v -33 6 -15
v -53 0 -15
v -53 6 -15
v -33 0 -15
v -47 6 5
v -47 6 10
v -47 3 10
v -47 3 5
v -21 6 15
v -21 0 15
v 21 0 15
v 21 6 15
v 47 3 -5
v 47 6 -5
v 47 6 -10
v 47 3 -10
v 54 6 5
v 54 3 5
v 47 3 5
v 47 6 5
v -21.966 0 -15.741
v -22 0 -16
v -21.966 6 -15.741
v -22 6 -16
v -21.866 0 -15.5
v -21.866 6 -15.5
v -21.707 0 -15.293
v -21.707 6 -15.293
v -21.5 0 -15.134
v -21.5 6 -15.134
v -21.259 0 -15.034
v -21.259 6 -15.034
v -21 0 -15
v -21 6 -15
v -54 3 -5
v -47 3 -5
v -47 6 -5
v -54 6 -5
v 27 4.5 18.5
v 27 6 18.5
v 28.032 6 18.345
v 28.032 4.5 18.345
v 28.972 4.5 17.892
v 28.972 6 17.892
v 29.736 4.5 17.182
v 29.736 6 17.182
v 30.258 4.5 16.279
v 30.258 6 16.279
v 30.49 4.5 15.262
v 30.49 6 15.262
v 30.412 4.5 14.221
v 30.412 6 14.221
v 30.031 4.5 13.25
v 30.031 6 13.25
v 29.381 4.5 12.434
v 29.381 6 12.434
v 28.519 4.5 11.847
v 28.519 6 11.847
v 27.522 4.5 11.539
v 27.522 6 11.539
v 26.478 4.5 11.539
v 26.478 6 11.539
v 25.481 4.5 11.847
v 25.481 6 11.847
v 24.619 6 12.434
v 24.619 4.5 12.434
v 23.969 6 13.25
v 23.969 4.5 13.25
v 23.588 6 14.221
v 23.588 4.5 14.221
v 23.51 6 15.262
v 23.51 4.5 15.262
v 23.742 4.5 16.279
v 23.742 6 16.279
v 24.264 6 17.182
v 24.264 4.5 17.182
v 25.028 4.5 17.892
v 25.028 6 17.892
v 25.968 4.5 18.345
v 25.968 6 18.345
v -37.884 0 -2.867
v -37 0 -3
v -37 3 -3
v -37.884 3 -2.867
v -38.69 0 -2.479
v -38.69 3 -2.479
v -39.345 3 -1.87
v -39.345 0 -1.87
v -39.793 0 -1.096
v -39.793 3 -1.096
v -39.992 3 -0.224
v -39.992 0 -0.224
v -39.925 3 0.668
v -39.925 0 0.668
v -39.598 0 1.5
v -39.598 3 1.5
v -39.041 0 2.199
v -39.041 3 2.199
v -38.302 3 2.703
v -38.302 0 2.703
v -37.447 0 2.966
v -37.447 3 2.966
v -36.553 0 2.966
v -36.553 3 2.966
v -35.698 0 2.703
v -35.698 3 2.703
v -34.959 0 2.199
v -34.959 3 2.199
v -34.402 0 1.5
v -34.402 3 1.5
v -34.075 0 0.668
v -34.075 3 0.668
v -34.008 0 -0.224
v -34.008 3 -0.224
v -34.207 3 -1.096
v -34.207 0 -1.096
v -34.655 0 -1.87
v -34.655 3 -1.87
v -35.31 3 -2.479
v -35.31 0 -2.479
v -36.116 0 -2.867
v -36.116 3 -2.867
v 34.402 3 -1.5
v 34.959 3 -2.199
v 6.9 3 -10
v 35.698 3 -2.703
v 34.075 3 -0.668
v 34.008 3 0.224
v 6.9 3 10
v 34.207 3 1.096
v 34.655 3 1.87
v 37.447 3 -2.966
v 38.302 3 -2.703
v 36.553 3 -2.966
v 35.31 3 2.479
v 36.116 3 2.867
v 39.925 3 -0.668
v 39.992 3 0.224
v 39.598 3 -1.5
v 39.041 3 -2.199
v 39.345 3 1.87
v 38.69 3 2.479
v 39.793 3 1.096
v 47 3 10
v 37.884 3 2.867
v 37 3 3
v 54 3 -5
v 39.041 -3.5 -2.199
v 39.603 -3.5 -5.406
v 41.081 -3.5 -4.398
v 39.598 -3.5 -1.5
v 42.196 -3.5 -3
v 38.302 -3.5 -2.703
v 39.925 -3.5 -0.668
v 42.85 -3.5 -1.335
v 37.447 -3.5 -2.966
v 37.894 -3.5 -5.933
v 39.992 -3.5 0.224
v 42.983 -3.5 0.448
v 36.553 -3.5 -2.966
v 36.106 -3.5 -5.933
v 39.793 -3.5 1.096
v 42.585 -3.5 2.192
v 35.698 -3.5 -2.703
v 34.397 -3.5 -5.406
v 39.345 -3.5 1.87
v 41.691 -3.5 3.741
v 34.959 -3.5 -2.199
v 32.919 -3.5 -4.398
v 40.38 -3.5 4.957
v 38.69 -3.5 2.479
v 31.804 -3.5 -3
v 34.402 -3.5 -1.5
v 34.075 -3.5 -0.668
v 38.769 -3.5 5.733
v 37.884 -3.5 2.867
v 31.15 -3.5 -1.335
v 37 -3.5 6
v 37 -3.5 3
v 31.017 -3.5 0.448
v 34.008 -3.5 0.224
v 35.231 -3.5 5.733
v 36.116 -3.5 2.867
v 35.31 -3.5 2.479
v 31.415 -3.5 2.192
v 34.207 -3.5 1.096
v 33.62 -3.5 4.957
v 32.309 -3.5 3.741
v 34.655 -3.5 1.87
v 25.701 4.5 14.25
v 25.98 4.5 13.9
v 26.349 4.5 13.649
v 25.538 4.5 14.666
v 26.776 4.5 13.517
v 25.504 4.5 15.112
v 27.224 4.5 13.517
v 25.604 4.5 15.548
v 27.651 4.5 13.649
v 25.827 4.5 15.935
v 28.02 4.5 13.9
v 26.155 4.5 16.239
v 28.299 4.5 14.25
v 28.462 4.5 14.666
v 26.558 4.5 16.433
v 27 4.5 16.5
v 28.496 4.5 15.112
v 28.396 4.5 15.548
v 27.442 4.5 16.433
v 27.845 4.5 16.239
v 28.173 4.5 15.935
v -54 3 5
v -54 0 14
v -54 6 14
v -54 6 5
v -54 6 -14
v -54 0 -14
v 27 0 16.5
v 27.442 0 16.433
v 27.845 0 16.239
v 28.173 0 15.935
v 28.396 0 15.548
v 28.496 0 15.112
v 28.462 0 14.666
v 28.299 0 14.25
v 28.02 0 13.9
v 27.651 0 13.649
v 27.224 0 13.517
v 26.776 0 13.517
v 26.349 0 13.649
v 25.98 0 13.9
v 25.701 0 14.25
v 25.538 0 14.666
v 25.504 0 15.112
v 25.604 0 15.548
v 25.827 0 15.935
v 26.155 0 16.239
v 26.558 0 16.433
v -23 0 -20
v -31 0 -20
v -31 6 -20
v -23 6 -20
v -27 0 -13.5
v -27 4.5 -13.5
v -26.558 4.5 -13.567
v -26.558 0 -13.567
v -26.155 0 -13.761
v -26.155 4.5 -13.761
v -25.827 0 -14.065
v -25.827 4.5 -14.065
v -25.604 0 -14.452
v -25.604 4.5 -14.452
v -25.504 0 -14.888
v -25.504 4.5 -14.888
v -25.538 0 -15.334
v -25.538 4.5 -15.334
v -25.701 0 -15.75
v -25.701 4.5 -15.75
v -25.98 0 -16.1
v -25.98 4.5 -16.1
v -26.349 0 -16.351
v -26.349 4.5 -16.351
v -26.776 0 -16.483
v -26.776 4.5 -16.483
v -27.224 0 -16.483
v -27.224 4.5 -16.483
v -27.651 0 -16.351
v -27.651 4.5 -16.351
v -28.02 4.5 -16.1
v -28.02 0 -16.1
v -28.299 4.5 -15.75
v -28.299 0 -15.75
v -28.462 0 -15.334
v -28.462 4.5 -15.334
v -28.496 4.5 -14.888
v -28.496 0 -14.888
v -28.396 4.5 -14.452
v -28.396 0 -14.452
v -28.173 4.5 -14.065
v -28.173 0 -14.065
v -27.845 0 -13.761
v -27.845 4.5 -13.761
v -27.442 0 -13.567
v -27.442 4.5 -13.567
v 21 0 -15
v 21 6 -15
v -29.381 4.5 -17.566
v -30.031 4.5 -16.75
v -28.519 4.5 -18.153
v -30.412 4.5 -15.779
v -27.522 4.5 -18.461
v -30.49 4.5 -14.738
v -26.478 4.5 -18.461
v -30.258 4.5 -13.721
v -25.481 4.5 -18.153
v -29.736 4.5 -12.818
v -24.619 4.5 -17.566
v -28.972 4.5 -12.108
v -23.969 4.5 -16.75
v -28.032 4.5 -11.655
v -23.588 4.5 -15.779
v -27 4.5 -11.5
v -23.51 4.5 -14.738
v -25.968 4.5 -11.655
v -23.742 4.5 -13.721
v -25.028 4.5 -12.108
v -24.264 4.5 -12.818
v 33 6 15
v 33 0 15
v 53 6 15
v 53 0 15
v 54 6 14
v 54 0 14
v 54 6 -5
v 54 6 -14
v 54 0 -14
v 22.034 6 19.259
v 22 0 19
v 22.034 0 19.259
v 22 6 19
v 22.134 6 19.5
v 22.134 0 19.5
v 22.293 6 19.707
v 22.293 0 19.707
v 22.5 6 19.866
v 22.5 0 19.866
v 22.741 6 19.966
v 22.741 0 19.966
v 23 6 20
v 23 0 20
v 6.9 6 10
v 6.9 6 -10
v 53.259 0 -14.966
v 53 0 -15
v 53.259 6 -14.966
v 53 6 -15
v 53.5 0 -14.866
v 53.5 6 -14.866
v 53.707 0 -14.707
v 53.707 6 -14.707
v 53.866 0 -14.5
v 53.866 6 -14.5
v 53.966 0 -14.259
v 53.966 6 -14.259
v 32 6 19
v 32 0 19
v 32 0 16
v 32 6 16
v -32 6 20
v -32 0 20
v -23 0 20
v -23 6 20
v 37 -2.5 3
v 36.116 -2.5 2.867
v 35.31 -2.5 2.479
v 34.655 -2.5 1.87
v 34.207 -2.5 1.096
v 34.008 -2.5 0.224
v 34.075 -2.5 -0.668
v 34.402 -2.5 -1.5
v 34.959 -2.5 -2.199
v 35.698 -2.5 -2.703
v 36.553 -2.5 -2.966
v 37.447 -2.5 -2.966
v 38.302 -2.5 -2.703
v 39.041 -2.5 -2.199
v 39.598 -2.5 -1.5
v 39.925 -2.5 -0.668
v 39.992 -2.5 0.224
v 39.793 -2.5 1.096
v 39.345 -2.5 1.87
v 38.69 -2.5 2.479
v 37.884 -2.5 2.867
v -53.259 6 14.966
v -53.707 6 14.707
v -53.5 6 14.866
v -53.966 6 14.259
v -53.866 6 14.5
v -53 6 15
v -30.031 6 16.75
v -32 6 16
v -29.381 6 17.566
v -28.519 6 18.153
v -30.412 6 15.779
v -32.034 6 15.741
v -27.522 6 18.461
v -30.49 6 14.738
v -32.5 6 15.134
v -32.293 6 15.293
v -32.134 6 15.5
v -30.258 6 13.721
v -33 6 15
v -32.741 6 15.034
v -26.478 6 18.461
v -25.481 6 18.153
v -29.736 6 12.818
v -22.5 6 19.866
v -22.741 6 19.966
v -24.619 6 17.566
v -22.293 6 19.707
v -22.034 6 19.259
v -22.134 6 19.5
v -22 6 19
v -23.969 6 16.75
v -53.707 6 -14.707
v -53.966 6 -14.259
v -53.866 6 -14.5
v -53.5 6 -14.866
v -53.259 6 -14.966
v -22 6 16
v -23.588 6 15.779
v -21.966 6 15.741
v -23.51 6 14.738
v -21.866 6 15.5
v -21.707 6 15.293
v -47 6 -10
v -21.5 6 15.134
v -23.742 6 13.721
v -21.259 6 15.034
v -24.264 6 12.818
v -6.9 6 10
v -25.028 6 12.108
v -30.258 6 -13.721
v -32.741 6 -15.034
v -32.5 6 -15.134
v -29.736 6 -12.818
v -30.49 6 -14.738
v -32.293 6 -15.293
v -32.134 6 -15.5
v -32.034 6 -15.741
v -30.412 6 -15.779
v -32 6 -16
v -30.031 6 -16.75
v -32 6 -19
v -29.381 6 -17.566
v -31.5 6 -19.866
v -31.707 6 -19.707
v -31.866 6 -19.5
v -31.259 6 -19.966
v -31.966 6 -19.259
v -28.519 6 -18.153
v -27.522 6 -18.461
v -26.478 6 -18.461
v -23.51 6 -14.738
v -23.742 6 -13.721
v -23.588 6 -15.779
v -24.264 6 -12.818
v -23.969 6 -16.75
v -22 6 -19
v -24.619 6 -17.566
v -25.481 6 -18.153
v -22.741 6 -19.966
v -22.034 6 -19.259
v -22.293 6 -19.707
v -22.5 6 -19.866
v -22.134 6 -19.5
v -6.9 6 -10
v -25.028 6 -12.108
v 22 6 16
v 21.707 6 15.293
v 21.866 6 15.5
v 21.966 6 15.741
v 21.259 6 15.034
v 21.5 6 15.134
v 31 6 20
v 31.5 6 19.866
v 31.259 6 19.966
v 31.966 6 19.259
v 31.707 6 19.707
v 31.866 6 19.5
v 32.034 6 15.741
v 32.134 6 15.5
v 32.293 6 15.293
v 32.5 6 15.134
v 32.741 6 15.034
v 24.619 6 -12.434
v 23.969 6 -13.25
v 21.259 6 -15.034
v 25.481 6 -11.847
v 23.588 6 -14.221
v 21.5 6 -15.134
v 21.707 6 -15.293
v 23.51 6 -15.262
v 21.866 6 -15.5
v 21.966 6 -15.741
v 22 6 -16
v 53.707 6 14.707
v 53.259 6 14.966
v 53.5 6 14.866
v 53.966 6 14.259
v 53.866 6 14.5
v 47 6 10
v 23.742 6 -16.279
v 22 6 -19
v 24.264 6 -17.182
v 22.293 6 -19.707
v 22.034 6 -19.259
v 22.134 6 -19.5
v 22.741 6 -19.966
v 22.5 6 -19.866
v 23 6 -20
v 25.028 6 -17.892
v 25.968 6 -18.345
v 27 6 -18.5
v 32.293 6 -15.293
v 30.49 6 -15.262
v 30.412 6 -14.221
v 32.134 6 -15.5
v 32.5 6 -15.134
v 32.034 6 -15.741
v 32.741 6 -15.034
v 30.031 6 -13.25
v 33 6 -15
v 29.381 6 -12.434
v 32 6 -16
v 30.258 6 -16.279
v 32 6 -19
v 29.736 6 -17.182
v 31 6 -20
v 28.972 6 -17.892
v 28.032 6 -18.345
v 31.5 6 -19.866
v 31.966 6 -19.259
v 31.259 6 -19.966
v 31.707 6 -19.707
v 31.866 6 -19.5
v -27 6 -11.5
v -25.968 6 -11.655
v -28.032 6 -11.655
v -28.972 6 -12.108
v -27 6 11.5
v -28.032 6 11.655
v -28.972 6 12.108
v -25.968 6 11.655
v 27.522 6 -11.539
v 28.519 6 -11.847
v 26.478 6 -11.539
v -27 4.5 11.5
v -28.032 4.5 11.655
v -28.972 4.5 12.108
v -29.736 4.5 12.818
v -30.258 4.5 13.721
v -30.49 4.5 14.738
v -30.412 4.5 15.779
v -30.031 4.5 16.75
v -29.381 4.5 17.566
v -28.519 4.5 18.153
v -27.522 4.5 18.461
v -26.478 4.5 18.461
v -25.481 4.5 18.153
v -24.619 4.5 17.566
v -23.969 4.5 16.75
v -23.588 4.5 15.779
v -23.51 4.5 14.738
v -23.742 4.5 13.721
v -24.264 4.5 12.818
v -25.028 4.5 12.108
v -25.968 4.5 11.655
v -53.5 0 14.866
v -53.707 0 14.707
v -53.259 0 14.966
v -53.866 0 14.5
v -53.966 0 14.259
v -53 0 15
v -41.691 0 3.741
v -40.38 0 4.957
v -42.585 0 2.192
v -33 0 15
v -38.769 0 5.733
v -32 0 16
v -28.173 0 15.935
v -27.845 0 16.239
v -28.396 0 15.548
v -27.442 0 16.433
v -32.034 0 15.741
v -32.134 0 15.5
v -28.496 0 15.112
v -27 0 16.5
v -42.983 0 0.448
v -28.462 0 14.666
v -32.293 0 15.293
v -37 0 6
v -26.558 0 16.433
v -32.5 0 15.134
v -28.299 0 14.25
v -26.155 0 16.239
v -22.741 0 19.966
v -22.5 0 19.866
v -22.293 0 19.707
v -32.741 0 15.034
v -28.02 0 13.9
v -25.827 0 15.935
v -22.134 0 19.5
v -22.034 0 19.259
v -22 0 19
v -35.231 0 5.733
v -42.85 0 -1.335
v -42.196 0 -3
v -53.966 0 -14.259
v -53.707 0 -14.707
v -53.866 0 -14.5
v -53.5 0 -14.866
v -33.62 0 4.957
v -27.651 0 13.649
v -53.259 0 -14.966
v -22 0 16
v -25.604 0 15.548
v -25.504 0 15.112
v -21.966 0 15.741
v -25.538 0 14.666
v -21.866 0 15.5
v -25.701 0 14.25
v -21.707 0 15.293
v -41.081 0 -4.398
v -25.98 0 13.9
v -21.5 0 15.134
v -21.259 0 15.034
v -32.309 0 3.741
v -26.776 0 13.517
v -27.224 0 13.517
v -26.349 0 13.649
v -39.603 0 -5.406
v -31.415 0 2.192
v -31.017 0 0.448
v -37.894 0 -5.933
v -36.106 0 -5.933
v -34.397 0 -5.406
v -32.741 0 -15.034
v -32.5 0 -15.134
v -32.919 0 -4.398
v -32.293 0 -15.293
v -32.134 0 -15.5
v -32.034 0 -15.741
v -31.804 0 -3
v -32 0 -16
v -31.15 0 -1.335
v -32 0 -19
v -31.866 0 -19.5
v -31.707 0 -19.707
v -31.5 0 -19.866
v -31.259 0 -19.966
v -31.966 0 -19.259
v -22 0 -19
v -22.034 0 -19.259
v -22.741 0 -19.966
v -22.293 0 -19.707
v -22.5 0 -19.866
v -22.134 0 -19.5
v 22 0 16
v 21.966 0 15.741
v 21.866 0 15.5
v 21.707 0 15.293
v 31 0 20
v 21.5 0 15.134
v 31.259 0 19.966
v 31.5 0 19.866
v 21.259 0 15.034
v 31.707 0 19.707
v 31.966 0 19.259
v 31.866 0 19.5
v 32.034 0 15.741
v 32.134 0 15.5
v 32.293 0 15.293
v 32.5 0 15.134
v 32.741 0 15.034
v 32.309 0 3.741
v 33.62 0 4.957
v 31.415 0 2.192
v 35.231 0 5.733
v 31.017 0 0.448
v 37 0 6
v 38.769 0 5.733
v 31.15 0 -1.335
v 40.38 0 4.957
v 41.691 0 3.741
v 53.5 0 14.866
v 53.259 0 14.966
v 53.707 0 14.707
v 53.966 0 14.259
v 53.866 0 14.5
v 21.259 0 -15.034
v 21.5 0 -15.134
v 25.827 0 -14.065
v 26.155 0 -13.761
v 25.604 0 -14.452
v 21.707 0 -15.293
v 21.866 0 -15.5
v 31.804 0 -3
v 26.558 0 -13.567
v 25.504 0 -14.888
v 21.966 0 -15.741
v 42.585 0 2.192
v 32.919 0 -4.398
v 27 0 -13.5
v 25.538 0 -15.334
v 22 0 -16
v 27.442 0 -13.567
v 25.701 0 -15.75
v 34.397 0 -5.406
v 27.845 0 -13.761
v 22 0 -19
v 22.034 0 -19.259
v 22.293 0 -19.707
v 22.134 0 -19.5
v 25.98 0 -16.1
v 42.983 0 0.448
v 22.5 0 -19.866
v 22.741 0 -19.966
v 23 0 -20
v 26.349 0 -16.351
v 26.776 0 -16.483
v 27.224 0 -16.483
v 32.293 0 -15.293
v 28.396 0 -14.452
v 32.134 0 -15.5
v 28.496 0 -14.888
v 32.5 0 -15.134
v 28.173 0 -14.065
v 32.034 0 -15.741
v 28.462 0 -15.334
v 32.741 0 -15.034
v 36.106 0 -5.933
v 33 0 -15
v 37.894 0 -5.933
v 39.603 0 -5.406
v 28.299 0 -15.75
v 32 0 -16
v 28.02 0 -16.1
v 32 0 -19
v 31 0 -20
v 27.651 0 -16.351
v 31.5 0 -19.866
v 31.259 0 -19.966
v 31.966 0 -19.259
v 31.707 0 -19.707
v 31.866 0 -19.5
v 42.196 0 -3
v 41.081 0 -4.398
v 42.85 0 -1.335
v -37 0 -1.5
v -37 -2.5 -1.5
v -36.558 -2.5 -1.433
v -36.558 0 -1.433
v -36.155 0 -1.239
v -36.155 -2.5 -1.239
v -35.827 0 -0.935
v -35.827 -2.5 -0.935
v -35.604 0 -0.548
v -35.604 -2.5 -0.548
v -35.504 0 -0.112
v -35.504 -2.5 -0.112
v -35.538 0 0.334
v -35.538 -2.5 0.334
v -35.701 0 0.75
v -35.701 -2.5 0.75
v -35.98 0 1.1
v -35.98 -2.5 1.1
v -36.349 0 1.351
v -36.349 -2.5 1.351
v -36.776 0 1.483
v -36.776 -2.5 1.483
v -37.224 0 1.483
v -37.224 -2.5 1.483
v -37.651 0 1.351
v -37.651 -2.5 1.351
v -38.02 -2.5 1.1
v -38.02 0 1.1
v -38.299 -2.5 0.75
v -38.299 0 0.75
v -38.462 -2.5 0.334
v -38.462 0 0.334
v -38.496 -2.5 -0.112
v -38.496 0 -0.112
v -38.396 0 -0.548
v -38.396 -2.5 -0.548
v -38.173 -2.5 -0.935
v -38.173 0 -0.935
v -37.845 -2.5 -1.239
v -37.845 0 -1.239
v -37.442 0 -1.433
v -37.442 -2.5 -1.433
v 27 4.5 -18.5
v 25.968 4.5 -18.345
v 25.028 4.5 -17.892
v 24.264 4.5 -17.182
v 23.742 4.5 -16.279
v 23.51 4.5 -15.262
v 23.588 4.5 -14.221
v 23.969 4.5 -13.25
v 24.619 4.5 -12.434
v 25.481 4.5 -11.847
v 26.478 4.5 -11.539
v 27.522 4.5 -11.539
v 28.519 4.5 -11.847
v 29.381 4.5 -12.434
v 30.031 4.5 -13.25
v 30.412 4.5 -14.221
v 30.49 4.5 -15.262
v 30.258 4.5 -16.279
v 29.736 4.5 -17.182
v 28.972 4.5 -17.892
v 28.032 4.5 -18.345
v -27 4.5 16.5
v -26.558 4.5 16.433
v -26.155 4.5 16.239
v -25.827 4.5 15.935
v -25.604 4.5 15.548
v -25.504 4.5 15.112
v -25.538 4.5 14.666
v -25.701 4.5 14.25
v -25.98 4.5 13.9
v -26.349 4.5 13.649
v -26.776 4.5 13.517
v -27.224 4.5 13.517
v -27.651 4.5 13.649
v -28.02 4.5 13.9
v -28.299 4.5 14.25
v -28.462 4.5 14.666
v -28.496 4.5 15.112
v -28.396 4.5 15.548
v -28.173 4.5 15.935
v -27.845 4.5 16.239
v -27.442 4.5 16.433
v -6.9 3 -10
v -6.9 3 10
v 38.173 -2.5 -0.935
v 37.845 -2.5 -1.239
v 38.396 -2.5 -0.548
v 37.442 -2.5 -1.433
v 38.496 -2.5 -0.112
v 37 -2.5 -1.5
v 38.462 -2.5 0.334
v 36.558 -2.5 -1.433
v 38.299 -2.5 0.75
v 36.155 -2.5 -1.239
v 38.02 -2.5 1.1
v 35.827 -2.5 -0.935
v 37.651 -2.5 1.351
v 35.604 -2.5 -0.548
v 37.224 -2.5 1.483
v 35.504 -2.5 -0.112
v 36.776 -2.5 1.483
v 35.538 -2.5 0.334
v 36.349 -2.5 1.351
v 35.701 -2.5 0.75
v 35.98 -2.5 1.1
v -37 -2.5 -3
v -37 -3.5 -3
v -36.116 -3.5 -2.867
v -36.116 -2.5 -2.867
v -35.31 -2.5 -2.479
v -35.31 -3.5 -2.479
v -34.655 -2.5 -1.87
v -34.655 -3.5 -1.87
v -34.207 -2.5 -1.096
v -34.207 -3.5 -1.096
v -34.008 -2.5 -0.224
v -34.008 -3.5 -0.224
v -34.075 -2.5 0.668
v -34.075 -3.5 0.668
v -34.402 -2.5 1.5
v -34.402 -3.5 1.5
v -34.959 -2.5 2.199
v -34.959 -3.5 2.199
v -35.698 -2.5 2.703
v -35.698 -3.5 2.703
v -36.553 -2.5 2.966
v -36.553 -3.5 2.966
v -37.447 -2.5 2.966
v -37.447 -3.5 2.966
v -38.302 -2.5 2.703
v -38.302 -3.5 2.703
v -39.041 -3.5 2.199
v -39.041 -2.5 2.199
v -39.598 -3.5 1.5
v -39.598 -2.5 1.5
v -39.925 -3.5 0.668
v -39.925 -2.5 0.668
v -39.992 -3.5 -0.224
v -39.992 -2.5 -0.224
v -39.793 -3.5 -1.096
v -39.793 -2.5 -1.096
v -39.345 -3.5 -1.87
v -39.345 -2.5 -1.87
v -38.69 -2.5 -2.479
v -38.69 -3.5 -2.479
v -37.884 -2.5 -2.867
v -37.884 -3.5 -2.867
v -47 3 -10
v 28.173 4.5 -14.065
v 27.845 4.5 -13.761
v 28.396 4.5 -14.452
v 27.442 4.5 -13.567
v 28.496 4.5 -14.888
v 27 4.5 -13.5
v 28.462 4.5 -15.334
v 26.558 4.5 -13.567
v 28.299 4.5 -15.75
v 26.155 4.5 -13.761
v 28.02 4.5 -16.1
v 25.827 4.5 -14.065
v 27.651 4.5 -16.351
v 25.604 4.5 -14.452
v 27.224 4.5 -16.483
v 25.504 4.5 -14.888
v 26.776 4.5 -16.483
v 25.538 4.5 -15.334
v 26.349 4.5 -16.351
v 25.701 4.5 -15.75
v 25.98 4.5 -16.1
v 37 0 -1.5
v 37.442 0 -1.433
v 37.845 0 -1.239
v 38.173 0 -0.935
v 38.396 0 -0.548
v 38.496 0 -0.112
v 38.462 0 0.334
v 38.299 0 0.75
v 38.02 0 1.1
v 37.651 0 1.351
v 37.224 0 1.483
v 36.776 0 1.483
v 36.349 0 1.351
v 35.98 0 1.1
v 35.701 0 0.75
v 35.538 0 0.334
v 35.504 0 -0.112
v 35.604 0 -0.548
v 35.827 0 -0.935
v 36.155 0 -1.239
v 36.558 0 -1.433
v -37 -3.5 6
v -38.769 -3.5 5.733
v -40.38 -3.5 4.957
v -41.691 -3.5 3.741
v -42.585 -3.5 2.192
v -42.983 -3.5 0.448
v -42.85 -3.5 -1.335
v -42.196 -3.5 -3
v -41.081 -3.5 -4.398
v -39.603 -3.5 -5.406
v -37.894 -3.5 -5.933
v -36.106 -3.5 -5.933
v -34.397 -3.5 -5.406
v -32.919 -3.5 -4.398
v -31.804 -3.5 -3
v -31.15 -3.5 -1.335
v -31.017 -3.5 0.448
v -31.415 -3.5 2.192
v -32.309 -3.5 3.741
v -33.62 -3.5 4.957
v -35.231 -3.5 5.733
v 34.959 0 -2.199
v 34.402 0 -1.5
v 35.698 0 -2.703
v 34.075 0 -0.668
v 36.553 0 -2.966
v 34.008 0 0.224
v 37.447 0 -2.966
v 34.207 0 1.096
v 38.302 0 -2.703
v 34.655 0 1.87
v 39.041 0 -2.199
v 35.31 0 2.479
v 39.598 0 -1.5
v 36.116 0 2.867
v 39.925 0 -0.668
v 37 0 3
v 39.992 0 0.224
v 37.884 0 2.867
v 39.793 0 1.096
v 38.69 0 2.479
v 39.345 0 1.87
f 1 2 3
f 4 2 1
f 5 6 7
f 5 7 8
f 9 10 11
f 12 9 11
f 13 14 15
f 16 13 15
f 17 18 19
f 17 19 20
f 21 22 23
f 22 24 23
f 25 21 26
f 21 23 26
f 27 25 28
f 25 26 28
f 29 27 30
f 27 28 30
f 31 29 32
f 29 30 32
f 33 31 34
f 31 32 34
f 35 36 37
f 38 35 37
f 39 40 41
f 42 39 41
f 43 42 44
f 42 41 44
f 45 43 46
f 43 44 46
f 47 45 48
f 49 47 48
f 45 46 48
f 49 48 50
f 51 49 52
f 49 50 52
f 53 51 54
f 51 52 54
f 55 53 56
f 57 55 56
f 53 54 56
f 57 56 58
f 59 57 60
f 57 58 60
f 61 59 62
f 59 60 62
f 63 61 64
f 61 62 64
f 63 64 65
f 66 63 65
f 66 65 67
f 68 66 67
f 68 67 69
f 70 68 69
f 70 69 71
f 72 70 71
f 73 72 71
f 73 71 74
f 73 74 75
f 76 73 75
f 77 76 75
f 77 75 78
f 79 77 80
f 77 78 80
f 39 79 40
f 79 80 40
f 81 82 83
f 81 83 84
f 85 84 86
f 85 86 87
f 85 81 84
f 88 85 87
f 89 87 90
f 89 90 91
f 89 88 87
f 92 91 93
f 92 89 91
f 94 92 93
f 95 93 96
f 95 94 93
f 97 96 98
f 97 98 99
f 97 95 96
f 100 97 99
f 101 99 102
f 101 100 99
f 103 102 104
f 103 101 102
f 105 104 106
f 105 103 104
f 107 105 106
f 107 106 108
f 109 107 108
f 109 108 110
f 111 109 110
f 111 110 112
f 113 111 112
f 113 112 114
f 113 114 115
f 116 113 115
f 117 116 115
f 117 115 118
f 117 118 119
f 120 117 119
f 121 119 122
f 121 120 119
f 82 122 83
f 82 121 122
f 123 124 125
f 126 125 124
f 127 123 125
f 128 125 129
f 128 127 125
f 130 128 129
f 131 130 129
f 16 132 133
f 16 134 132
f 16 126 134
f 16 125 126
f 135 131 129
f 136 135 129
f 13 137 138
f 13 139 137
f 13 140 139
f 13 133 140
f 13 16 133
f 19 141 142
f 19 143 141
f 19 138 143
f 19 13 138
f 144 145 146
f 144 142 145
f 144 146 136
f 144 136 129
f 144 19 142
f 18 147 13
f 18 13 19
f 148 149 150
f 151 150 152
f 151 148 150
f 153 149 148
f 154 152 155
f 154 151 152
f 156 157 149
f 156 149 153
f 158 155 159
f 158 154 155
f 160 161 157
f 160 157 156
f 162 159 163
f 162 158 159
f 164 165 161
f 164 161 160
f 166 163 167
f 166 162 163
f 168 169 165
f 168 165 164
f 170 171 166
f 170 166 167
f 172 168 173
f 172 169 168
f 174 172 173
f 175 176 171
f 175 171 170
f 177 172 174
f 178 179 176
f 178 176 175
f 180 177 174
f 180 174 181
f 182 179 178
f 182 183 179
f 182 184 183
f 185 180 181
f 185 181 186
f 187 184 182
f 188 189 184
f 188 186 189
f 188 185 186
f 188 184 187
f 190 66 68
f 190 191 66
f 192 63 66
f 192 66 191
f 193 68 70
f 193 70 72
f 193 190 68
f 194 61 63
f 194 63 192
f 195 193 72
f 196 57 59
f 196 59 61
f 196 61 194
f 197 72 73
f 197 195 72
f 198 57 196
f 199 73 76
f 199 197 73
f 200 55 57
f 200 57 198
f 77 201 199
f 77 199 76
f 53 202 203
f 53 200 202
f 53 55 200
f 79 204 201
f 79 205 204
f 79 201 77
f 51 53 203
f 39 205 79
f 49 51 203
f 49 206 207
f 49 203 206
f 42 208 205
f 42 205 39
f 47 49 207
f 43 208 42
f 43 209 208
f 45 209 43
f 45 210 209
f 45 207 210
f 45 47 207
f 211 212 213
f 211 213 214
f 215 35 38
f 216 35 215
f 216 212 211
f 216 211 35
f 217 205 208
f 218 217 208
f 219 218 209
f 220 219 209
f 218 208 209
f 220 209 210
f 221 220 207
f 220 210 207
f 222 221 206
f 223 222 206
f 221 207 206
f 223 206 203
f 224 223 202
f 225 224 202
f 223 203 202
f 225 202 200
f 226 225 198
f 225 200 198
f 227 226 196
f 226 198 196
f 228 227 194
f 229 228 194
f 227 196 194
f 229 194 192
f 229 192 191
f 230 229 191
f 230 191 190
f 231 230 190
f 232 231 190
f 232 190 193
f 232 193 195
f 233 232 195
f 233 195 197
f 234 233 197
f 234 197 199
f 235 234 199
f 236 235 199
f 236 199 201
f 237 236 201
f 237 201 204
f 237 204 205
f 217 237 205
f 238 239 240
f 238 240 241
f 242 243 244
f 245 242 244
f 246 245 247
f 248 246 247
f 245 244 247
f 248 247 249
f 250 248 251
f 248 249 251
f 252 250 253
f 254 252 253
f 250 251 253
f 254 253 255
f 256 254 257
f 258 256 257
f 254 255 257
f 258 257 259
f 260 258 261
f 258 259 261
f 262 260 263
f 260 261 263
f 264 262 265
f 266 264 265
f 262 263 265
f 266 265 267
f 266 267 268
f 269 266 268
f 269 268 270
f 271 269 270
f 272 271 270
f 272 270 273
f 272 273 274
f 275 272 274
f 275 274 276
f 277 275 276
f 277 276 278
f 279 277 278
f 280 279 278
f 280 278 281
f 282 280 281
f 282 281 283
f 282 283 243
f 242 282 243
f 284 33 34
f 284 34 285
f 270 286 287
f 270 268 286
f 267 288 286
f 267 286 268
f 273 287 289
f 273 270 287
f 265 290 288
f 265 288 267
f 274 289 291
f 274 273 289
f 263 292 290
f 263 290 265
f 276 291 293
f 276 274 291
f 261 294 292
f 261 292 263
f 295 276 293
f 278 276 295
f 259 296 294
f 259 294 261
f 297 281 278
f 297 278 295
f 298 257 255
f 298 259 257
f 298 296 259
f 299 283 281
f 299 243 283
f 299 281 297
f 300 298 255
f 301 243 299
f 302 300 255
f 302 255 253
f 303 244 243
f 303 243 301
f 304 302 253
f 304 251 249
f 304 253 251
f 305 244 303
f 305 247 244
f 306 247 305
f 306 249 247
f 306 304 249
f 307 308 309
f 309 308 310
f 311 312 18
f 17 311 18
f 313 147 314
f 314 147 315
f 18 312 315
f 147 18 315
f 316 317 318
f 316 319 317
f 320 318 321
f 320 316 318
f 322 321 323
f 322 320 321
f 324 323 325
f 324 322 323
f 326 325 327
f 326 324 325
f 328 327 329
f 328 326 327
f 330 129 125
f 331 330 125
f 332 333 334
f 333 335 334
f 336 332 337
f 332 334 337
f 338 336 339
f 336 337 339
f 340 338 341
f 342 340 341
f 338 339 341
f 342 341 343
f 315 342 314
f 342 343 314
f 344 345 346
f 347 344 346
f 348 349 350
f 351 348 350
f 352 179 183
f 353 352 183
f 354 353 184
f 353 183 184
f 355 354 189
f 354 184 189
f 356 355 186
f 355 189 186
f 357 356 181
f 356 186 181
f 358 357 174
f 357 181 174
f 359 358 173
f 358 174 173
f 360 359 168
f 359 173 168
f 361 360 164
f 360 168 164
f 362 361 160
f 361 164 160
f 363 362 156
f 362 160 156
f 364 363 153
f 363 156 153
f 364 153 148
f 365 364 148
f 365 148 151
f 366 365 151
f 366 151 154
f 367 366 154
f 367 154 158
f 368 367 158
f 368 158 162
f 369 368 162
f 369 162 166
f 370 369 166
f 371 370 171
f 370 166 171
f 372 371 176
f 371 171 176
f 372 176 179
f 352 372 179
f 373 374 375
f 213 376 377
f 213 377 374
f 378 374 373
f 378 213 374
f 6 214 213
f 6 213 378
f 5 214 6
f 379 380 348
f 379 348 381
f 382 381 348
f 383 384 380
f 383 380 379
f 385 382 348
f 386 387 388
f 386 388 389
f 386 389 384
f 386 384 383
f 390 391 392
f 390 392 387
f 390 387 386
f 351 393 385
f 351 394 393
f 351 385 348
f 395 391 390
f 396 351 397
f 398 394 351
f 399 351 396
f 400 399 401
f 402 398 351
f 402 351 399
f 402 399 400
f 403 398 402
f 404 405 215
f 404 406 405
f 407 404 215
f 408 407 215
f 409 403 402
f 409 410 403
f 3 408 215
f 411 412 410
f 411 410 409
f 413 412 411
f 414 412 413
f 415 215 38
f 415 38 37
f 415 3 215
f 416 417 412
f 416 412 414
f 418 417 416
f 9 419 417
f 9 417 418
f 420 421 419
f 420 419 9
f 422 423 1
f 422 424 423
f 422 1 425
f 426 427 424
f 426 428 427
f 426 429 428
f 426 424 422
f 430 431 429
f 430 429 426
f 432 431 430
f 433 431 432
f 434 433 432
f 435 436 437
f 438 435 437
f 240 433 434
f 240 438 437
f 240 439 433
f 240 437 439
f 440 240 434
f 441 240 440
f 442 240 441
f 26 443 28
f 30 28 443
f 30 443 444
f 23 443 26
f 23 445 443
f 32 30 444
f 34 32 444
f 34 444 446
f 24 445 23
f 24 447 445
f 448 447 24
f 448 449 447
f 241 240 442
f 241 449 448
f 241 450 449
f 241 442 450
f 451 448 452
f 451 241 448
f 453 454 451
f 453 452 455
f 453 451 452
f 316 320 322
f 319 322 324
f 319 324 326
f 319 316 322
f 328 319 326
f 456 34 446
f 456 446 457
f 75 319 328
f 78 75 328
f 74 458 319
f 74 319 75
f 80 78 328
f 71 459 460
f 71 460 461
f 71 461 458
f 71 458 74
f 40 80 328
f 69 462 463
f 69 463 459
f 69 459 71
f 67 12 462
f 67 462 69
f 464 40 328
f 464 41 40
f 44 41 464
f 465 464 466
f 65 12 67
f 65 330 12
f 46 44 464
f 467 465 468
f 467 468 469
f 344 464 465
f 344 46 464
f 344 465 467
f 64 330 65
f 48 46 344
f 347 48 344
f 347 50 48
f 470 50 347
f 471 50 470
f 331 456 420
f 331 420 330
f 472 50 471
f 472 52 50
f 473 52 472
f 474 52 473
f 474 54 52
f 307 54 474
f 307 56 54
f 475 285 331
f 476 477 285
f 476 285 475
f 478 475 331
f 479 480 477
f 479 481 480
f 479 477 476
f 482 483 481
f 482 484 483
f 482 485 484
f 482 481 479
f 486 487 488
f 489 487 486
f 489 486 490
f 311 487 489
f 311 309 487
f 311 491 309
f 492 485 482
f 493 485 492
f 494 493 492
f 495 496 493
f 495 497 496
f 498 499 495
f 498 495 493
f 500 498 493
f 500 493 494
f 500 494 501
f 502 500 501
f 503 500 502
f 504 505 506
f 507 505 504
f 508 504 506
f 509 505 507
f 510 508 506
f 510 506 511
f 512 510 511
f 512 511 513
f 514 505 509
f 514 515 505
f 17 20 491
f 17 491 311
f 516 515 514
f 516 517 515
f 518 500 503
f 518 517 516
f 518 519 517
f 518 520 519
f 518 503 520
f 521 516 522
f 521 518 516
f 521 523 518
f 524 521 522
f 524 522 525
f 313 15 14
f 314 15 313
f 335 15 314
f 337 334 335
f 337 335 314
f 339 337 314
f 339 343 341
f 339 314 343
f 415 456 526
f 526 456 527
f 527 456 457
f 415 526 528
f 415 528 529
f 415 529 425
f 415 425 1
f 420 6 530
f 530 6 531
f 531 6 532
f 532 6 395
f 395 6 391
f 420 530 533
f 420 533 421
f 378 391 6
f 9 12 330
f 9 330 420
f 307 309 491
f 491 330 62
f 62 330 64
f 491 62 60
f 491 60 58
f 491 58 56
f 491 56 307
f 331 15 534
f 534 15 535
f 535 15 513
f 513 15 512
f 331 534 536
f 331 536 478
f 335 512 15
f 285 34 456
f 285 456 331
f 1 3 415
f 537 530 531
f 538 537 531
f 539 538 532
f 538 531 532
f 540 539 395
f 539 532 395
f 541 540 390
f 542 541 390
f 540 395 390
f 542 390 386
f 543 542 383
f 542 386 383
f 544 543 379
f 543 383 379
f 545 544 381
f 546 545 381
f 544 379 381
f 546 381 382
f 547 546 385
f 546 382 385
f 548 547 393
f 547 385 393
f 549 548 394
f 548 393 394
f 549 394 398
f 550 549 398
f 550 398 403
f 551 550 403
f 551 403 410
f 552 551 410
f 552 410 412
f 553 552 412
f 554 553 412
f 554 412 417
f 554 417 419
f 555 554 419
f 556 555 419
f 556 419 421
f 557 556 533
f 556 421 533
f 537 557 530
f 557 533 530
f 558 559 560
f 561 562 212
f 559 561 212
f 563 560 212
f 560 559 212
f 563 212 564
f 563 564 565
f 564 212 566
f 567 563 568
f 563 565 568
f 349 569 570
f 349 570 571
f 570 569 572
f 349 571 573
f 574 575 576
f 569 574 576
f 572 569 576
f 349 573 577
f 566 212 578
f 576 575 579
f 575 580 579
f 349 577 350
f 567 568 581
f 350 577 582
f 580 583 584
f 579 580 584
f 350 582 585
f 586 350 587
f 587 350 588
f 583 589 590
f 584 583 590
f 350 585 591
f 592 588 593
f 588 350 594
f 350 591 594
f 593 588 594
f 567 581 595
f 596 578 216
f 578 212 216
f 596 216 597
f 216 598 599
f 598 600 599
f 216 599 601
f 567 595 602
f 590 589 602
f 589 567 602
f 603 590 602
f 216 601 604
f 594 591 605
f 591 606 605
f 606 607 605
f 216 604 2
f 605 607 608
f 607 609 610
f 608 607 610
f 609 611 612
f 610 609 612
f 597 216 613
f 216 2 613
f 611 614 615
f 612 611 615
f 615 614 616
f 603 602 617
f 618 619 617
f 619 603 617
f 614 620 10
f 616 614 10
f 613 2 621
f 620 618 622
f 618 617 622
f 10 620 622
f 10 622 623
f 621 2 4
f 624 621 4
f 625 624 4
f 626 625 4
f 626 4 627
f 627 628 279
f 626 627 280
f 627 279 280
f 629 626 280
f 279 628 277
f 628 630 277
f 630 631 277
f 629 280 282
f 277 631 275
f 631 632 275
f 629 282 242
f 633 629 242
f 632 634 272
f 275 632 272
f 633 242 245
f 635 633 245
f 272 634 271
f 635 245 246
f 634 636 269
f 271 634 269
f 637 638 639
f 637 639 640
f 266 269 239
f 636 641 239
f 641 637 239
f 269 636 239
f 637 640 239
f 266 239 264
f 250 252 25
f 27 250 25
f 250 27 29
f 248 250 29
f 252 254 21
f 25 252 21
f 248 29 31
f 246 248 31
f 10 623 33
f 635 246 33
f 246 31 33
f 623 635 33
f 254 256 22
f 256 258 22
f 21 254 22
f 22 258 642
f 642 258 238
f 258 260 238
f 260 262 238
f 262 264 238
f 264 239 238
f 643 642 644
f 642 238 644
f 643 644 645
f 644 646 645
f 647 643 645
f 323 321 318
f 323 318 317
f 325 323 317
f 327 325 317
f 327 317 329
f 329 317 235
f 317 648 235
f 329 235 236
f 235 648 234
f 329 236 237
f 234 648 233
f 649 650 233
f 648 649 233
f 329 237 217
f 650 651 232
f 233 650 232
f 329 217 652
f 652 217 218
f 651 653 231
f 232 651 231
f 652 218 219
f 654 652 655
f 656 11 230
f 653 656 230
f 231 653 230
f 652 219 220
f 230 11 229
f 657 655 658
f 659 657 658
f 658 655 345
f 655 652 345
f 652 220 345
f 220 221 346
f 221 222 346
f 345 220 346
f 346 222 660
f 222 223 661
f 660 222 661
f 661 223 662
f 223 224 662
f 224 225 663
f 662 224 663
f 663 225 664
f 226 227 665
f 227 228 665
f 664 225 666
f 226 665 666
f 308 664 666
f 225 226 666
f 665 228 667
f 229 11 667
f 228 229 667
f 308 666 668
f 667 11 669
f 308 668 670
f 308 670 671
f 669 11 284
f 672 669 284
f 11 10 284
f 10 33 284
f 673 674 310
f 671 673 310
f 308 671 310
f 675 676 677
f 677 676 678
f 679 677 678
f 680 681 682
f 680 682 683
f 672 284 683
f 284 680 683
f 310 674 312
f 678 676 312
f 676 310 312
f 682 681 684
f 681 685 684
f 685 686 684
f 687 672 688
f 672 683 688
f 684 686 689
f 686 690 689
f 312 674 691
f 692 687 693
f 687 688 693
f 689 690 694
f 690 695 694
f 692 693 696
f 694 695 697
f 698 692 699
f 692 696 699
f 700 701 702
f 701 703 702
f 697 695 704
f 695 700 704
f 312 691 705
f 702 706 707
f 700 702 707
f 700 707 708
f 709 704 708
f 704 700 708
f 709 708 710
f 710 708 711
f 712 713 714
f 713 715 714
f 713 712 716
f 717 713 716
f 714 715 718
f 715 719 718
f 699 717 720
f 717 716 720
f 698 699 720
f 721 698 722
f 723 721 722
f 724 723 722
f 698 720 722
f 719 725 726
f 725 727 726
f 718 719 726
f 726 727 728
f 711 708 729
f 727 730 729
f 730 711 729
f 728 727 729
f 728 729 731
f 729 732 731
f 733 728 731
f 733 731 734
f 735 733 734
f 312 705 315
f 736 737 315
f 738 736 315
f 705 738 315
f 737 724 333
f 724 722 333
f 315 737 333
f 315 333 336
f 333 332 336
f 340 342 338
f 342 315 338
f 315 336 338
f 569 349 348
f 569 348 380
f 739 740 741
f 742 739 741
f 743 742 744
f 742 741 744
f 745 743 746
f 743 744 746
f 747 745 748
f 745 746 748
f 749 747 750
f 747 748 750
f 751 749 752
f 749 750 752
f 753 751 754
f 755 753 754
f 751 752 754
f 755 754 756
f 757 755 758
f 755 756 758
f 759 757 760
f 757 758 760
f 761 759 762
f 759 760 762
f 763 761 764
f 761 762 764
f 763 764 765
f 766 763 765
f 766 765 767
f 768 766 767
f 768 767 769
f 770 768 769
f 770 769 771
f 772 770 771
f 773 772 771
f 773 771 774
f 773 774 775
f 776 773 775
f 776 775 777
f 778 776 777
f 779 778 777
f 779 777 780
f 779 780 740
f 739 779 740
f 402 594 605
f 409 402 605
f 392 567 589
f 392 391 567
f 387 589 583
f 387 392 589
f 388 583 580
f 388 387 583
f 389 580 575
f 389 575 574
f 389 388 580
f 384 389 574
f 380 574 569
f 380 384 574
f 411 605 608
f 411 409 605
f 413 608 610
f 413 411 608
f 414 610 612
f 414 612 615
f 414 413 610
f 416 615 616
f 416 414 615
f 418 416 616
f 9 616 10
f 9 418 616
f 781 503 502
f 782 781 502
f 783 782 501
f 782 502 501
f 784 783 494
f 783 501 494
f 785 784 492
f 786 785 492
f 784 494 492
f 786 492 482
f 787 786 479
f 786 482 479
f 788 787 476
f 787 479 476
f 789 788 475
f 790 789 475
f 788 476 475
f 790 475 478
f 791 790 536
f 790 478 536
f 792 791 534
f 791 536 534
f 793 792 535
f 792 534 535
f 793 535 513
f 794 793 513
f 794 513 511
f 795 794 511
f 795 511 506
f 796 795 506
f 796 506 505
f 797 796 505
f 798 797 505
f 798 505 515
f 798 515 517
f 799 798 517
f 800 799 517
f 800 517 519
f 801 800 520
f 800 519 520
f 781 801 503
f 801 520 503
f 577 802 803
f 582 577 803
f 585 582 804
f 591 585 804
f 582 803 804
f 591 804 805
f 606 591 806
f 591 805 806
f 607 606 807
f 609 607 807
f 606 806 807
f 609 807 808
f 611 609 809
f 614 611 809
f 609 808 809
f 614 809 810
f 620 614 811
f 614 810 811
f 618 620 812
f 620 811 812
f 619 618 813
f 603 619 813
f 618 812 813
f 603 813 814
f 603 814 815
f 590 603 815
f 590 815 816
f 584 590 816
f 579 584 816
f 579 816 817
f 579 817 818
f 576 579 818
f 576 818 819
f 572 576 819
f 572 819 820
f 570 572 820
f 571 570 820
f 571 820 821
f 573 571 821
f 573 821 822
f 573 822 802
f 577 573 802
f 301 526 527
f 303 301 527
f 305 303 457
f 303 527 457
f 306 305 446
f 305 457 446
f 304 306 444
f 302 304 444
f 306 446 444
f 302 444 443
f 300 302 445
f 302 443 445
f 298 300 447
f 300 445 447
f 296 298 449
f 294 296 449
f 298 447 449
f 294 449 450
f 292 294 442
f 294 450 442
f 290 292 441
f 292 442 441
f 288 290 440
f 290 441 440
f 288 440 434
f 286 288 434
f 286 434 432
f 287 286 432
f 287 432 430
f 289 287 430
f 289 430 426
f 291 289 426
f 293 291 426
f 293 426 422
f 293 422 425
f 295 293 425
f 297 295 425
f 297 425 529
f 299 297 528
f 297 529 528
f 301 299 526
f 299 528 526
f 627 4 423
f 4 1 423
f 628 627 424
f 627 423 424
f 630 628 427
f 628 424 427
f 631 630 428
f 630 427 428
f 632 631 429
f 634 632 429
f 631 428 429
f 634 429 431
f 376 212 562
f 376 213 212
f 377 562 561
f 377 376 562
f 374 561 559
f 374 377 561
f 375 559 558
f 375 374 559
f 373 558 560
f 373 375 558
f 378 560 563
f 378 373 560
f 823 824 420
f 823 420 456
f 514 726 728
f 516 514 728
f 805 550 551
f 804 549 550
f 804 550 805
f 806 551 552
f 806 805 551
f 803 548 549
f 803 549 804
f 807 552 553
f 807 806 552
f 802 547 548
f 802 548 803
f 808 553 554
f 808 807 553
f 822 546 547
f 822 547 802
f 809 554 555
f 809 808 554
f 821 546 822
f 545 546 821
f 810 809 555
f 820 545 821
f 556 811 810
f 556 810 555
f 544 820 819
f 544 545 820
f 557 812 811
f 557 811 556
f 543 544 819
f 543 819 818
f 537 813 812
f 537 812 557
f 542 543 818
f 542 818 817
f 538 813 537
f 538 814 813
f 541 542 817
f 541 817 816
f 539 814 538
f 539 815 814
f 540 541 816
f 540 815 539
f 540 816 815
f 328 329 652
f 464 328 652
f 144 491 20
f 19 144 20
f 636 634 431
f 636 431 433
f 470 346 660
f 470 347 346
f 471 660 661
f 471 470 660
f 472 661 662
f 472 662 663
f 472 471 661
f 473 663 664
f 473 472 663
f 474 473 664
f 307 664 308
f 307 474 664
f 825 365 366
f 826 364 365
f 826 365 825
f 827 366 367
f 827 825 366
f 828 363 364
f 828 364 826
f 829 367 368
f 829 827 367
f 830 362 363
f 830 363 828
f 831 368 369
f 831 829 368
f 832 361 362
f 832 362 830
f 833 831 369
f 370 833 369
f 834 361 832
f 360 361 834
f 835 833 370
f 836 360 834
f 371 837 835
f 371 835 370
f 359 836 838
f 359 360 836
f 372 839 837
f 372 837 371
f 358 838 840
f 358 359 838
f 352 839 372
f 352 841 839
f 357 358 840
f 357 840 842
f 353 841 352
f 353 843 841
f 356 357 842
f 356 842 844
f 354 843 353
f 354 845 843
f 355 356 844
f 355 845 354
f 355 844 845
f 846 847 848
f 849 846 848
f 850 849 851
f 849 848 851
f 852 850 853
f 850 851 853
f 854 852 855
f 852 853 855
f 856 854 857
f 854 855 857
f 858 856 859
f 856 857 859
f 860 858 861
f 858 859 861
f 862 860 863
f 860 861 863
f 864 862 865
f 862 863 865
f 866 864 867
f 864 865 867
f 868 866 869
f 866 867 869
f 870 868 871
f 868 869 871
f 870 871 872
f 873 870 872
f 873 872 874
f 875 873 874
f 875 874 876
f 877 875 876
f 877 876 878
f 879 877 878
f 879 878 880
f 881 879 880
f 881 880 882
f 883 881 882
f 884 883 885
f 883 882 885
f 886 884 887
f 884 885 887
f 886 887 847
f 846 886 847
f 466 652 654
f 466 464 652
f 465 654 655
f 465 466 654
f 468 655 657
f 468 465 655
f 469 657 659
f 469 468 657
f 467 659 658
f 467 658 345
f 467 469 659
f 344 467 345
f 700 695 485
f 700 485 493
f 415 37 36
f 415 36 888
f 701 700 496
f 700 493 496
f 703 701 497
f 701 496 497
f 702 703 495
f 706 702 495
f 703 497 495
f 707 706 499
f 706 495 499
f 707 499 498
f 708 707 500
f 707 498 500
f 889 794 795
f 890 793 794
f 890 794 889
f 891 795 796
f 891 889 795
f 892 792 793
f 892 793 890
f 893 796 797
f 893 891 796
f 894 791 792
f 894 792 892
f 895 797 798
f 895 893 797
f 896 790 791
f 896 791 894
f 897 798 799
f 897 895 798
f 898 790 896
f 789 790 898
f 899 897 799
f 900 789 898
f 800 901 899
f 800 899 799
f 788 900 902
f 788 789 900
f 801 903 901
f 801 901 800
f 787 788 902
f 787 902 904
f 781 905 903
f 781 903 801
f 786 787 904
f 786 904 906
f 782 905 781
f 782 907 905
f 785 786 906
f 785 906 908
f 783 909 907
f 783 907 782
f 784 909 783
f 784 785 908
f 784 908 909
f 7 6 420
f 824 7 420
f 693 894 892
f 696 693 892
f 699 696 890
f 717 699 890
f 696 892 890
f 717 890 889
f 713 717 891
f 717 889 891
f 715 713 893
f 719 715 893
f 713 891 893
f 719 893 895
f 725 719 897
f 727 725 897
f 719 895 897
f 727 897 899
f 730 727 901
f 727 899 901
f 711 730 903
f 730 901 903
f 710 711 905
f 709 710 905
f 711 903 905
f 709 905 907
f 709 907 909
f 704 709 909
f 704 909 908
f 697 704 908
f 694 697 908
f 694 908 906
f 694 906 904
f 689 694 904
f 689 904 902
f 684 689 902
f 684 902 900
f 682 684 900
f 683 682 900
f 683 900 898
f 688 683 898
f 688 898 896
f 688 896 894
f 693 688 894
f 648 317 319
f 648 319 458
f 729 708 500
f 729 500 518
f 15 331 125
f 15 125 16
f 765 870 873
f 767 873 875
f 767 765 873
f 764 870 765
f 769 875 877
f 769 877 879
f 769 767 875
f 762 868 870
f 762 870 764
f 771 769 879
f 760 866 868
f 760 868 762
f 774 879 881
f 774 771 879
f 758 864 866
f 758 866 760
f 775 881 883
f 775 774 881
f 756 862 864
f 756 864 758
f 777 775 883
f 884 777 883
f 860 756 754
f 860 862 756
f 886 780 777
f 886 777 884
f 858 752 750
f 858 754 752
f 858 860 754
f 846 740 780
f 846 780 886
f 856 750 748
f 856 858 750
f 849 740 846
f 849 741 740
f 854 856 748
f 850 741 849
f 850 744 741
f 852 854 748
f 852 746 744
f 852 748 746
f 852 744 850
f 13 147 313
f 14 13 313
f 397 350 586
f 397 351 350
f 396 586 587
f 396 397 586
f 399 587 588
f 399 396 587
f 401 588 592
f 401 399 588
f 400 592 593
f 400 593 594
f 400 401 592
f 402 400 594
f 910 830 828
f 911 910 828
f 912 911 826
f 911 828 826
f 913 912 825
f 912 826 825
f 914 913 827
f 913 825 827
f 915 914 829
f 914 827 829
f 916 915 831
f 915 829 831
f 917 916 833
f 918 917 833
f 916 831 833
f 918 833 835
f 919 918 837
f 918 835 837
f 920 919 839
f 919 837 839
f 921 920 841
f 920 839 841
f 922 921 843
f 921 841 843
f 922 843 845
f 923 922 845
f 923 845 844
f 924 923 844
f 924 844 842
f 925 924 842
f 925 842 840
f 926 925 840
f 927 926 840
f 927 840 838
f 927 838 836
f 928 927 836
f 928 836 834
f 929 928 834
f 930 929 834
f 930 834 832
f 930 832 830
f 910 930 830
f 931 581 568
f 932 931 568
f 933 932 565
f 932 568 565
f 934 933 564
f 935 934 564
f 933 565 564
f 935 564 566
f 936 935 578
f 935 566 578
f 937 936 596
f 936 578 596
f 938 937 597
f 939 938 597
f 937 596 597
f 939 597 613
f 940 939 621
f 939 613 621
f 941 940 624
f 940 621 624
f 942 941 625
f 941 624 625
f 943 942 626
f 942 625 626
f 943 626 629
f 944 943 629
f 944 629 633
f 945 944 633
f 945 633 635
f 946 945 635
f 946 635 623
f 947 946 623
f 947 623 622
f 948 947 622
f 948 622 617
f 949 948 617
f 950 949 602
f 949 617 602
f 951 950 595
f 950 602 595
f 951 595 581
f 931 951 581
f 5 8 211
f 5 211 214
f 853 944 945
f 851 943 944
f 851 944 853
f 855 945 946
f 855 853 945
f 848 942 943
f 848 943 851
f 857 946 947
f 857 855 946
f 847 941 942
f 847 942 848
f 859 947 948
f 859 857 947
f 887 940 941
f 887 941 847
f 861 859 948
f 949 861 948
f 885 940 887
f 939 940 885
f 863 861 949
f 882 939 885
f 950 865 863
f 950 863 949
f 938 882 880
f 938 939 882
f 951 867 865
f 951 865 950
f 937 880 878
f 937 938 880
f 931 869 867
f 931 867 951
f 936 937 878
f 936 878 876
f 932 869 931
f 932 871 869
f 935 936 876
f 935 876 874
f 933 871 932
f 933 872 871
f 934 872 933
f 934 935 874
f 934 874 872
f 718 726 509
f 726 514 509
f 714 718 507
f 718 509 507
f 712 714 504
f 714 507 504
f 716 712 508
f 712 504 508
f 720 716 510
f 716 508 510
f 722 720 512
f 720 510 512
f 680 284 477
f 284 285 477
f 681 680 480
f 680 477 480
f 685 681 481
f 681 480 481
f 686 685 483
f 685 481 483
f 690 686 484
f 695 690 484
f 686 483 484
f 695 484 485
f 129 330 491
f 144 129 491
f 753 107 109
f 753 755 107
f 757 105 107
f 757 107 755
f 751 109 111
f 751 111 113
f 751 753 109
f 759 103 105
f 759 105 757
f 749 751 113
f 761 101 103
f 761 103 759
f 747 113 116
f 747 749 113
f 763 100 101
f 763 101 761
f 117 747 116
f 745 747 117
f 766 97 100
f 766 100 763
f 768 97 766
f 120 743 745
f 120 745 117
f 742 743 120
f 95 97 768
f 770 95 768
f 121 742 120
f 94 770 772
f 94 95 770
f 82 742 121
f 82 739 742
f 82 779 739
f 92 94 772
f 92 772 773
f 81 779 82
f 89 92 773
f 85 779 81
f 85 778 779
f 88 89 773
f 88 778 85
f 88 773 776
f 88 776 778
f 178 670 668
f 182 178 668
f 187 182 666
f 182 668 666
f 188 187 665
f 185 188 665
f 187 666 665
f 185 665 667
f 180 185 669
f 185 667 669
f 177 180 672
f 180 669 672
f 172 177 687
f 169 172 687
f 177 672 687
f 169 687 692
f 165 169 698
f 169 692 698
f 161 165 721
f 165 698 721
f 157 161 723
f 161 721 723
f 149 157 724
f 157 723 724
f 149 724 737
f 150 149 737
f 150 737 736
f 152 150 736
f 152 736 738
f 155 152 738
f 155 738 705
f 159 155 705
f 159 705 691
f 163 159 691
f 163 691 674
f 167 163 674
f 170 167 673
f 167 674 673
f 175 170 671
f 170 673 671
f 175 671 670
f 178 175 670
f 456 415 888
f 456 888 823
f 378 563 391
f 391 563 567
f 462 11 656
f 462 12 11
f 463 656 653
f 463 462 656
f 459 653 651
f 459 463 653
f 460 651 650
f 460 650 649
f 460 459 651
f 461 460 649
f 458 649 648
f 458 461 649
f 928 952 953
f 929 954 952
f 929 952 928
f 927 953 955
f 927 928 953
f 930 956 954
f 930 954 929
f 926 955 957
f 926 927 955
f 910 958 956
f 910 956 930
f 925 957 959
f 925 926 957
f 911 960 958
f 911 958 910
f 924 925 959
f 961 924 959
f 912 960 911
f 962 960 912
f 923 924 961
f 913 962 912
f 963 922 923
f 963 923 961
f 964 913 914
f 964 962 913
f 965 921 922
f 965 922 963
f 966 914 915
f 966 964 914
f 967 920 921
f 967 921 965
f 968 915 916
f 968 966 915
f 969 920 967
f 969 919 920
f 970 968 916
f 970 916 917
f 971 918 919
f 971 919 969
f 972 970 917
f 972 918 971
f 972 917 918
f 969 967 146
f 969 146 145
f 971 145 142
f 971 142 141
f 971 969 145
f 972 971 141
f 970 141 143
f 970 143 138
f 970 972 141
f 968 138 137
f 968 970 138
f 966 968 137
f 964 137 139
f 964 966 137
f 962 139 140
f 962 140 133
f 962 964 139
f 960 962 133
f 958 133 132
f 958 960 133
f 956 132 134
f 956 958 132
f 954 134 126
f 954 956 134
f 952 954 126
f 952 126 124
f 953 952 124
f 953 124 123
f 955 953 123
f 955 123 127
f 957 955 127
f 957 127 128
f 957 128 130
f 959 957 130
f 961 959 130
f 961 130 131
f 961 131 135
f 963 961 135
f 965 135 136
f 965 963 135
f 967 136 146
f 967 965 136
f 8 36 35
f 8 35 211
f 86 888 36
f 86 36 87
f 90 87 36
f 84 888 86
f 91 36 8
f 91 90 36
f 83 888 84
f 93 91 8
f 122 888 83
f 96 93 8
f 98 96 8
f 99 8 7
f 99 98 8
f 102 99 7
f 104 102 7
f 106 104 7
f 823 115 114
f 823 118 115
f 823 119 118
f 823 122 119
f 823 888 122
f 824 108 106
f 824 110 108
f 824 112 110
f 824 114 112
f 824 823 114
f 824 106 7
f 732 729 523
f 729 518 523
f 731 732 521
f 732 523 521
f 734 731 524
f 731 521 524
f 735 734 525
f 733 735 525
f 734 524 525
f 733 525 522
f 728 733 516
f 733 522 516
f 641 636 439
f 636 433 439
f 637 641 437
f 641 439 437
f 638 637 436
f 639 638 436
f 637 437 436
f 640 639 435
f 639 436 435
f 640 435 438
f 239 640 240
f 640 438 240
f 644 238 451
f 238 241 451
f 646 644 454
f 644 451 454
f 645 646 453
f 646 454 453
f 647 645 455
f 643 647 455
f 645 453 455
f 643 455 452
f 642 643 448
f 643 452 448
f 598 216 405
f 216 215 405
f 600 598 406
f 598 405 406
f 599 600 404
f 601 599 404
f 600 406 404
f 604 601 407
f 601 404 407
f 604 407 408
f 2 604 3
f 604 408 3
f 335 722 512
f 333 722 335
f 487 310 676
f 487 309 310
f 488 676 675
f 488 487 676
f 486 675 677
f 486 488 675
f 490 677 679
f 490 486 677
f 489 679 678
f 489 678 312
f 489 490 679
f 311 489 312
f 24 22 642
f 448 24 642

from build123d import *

# Parameters (mm, degrees)
SKETCH_1_W               = 108
SKETCH_1_H               = 30
SKETCH_1_W_2             = 10
SKETCH_1_H_2             = 5
EXTRUDE_1_DEPTH          = 6
SKETCH_2_R               = 1.5
CUT_EXTRUDE_1_DEPTH      = 6
SKETCH_3_W               = 94
SKETCH_3_H               = 20
CUT_EXTRUDE_2_DEPTH      = 3
SKETCH_4_R               = 6
EXTRUDE_2_DEPTH          = 3.5
SKETCH_5_R               = 3
CUT_EXTRUDE_3_DEPTH      = 1
SKETCH_6_R               = 1.5
CUT_EXTRUDE_4_DEPTH      = 59.208676329
CUT_EXTRUDE_START        = -3
SKETCH_7_R               = 3
CUT_EXTRUDE_5_DEPTH      = 3
SKETCH_8_R               = 3.5
CUT_EXTRUDE_6_DEPTH      = 1.5
FILLET_1_R               = 1
CUT_EXTRUDE_7_DEPTH      = 111
CUT_EXTRUDE_7_DEPTH_BACK = 111
SKETCH_9_W               = 10
SKETCH_9_H               = 3
SKETCH_10_W              = 13.8
SKETCH_10_H              = 20
EXTRUDE_3_DEPTH          = 3


with BuildPart() as part:
    # 草图1 → 凸台-拉伸1 (new body)
    with BuildSketch(Plane(origin=(0, 0, 0), x_dir=(1, 0, 0), z_dir=(0, 1, 0))):
        Rectangle(SKETCH_1_W, SKETCH_1_H)
        with Locations((-27, 17.5)):
            Rectangle(SKETCH_1_W_2, SKETCH_1_H_2)
        with Locations((27, 17.5)):
            Rectangle(SKETCH_1_W_2, SKETCH_1_H_2)
        with Locations((27, -17.5)):
            Rectangle(SKETCH_1_W_2, SKETCH_1_H_2)
        with Locations((-27, -17.5)):
            Rectangle(SKETCH_1_W_2, SKETCH_1_H_2)
    extrude(amount=EXTRUDE_1_DEPTH)

    # 草图2 → 切除-拉伸1 (cut)
    with BuildSketch(Plane(origin=(0, 6, 0), x_dir=(1, 0, 0), z_dir=(0, 1, 0))):
        with Locations(Location((27, -15, 0), (0, 0, 270))):
            Circle(SKETCH_2_R)
        with Locations(Location((-27, -15, 0), (0, 0, 270))):
            Circle(SKETCH_2_R)
        with Locations(Location((27, 15, 0), (0, 0, 270))):
            Circle(SKETCH_2_R)
        with Locations(Location((-27, 15, 0), (0, 0, 270))):
            Circle(SKETCH_2_R)
    extrude(amount=-CUT_EXTRUDE_1_DEPTH, mode=Mode.SUBTRACT)

    # 草图3 → 切除-拉伸2 (cut)
    with BuildSketch(Plane(origin=(0, 6, 0), x_dir=(1, 0, 0), z_dir=(0, 1, 0))):
        Rectangle(SKETCH_3_W, SKETCH_3_H)
    extrude(amount=-CUT_EXTRUDE_2_DEPTH, mode=Mode.SUBTRACT)

    # 草图4 → 凸台-拉伸2 (add)
    with BuildSketch(Plane.XZ):
        with Locations(Location((-37, 0, 0), (0, 0, 90))):
            Circle(SKETCH_4_R)
        with Locations(Location((37, 0, 0), (0, 0, 90))):
            Circle(SKETCH_4_R)
    extrude(amount=EXTRUDE_2_DEPTH)

    # 草图5 → 切除-拉伸3 (cut)
    with BuildSketch(Plane.XZ.offset(3.5)):
        with Locations(Location((-37, 0, 0), (0, 0, 270))):
            Circle(SKETCH_5_R)
        with Locations(Location((37, 0, 0), (0, 0, 90))):
            Circle(SKETCH_5_R)
    extrude(amount=-CUT_EXTRUDE_3_DEPTH, mode=Mode.SUBTRACT)

    # 草图6 → 切除-拉伸4 (cut, through all)
    with BuildSketch(Plane.XZ.offset(2.5)):
        with Locations(Location((-37, 0, 0), (0, 0, 270))):
            Circle(SKETCH_6_R)
        with Locations(Location((37, 0, 0), (0, 0, 270))):
            Circle(SKETCH_6_R)
    extrude(amount=-CUT_EXTRUDE_4_DEPTH, mode=Mode.SUBTRACT)

    # 草图7 → 切除-拉伸5 (cut)
    with BuildSketch(Plane(origin=(0, 3, 0), x_dir=(1, 0, 0), z_dir=(0, 1, 0)).offset(CUT_EXTRUDE_START)):
        with Locations(Location((-37, 0, 0), (0, 0, 90))):
            Circle(SKETCH_7_R)
        with Locations(Location((37, 0, 0), (0, 0, 270))):
            Circle(SKETCH_7_R)
    extrude(amount=CUT_EXTRUDE_5_DEPTH, mode=Mode.SUBTRACT)

    # 草图8 → 切除-拉伸6 (cut)
    with BuildSketch(Plane(origin=(0, 6, 0), x_dir=(1, 0, 0), z_dir=(0, 1, 0))):
        with Locations(Location((-27, 15, 0), (0, 0, 270))):
            Circle(SKETCH_8_R)
        with Locations(Location((27, 15, 0), (0, 0, 90))):
            Circle(SKETCH_8_R)
        with Locations(Location((27, -15, 0), (0, 0, 270))):
            Circle(SKETCH_8_R)
        with Locations(Location((-27, -15, 0), (0, 0, 90))):
            Circle(SKETCH_8_R)
    extrude(amount=-CUT_EXTRUDE_6_DEPTH, mode=Mode.SUBTRACT)

    # 圆角1
    fillet_1_edges = [part.edges().sort_by_distance(p)[0] for p in [
        (-54, 3, 15),
        (-54, 3, -15),
        (-32, 3, -15),
        (-32, 3, -20),
        (-22, 3, -20),
        (-22, 3, -15),
        (22, 3, -15),
        (22, 3, -20),
        (32, 3, -20),
        (32, 3, -15),
        (54, 3, -15),
        (54, 3, 15),
        (32, 3, 15),
        (32, 3, 20),
        (22, 3, 20),
        (22, 3, 15),
        (-22, 3, 15),
        (-22, 3, 20),
        (-32, 3, 15),
    ]]
    fillet(fillet_1_edges, radius=FILLET_1_R)

    # 草图9 → 切除-拉伸7 (cut, two sides: drawn at the far end of the back side and taken through both)
    with BuildSketch(Plane.ZY.offset(54).offset(-CUT_EXTRUDE_7_DEPTH_BACK)):
        with Locations((0, 4.5)):
            Rectangle(SKETCH_9_W, SKETCH_9_H)
    extrude(amount=CUT_EXTRUDE_7_DEPTH + CUT_EXTRUDE_7_DEPTH_BACK, mode=Mode.SUBTRACT)

    # 草图10 → 凸台-拉伸3 (add)
    with BuildSketch(Plane(origin=(0, 3, 0), x_dir=(1, 0, 0), z_dir=(0, 1, 0))):
        Rectangle(SKETCH_10_W, SKETCH_10_H)
    extrude(amount=EXTRUDE_3_DEPTH)


solid = part.part
